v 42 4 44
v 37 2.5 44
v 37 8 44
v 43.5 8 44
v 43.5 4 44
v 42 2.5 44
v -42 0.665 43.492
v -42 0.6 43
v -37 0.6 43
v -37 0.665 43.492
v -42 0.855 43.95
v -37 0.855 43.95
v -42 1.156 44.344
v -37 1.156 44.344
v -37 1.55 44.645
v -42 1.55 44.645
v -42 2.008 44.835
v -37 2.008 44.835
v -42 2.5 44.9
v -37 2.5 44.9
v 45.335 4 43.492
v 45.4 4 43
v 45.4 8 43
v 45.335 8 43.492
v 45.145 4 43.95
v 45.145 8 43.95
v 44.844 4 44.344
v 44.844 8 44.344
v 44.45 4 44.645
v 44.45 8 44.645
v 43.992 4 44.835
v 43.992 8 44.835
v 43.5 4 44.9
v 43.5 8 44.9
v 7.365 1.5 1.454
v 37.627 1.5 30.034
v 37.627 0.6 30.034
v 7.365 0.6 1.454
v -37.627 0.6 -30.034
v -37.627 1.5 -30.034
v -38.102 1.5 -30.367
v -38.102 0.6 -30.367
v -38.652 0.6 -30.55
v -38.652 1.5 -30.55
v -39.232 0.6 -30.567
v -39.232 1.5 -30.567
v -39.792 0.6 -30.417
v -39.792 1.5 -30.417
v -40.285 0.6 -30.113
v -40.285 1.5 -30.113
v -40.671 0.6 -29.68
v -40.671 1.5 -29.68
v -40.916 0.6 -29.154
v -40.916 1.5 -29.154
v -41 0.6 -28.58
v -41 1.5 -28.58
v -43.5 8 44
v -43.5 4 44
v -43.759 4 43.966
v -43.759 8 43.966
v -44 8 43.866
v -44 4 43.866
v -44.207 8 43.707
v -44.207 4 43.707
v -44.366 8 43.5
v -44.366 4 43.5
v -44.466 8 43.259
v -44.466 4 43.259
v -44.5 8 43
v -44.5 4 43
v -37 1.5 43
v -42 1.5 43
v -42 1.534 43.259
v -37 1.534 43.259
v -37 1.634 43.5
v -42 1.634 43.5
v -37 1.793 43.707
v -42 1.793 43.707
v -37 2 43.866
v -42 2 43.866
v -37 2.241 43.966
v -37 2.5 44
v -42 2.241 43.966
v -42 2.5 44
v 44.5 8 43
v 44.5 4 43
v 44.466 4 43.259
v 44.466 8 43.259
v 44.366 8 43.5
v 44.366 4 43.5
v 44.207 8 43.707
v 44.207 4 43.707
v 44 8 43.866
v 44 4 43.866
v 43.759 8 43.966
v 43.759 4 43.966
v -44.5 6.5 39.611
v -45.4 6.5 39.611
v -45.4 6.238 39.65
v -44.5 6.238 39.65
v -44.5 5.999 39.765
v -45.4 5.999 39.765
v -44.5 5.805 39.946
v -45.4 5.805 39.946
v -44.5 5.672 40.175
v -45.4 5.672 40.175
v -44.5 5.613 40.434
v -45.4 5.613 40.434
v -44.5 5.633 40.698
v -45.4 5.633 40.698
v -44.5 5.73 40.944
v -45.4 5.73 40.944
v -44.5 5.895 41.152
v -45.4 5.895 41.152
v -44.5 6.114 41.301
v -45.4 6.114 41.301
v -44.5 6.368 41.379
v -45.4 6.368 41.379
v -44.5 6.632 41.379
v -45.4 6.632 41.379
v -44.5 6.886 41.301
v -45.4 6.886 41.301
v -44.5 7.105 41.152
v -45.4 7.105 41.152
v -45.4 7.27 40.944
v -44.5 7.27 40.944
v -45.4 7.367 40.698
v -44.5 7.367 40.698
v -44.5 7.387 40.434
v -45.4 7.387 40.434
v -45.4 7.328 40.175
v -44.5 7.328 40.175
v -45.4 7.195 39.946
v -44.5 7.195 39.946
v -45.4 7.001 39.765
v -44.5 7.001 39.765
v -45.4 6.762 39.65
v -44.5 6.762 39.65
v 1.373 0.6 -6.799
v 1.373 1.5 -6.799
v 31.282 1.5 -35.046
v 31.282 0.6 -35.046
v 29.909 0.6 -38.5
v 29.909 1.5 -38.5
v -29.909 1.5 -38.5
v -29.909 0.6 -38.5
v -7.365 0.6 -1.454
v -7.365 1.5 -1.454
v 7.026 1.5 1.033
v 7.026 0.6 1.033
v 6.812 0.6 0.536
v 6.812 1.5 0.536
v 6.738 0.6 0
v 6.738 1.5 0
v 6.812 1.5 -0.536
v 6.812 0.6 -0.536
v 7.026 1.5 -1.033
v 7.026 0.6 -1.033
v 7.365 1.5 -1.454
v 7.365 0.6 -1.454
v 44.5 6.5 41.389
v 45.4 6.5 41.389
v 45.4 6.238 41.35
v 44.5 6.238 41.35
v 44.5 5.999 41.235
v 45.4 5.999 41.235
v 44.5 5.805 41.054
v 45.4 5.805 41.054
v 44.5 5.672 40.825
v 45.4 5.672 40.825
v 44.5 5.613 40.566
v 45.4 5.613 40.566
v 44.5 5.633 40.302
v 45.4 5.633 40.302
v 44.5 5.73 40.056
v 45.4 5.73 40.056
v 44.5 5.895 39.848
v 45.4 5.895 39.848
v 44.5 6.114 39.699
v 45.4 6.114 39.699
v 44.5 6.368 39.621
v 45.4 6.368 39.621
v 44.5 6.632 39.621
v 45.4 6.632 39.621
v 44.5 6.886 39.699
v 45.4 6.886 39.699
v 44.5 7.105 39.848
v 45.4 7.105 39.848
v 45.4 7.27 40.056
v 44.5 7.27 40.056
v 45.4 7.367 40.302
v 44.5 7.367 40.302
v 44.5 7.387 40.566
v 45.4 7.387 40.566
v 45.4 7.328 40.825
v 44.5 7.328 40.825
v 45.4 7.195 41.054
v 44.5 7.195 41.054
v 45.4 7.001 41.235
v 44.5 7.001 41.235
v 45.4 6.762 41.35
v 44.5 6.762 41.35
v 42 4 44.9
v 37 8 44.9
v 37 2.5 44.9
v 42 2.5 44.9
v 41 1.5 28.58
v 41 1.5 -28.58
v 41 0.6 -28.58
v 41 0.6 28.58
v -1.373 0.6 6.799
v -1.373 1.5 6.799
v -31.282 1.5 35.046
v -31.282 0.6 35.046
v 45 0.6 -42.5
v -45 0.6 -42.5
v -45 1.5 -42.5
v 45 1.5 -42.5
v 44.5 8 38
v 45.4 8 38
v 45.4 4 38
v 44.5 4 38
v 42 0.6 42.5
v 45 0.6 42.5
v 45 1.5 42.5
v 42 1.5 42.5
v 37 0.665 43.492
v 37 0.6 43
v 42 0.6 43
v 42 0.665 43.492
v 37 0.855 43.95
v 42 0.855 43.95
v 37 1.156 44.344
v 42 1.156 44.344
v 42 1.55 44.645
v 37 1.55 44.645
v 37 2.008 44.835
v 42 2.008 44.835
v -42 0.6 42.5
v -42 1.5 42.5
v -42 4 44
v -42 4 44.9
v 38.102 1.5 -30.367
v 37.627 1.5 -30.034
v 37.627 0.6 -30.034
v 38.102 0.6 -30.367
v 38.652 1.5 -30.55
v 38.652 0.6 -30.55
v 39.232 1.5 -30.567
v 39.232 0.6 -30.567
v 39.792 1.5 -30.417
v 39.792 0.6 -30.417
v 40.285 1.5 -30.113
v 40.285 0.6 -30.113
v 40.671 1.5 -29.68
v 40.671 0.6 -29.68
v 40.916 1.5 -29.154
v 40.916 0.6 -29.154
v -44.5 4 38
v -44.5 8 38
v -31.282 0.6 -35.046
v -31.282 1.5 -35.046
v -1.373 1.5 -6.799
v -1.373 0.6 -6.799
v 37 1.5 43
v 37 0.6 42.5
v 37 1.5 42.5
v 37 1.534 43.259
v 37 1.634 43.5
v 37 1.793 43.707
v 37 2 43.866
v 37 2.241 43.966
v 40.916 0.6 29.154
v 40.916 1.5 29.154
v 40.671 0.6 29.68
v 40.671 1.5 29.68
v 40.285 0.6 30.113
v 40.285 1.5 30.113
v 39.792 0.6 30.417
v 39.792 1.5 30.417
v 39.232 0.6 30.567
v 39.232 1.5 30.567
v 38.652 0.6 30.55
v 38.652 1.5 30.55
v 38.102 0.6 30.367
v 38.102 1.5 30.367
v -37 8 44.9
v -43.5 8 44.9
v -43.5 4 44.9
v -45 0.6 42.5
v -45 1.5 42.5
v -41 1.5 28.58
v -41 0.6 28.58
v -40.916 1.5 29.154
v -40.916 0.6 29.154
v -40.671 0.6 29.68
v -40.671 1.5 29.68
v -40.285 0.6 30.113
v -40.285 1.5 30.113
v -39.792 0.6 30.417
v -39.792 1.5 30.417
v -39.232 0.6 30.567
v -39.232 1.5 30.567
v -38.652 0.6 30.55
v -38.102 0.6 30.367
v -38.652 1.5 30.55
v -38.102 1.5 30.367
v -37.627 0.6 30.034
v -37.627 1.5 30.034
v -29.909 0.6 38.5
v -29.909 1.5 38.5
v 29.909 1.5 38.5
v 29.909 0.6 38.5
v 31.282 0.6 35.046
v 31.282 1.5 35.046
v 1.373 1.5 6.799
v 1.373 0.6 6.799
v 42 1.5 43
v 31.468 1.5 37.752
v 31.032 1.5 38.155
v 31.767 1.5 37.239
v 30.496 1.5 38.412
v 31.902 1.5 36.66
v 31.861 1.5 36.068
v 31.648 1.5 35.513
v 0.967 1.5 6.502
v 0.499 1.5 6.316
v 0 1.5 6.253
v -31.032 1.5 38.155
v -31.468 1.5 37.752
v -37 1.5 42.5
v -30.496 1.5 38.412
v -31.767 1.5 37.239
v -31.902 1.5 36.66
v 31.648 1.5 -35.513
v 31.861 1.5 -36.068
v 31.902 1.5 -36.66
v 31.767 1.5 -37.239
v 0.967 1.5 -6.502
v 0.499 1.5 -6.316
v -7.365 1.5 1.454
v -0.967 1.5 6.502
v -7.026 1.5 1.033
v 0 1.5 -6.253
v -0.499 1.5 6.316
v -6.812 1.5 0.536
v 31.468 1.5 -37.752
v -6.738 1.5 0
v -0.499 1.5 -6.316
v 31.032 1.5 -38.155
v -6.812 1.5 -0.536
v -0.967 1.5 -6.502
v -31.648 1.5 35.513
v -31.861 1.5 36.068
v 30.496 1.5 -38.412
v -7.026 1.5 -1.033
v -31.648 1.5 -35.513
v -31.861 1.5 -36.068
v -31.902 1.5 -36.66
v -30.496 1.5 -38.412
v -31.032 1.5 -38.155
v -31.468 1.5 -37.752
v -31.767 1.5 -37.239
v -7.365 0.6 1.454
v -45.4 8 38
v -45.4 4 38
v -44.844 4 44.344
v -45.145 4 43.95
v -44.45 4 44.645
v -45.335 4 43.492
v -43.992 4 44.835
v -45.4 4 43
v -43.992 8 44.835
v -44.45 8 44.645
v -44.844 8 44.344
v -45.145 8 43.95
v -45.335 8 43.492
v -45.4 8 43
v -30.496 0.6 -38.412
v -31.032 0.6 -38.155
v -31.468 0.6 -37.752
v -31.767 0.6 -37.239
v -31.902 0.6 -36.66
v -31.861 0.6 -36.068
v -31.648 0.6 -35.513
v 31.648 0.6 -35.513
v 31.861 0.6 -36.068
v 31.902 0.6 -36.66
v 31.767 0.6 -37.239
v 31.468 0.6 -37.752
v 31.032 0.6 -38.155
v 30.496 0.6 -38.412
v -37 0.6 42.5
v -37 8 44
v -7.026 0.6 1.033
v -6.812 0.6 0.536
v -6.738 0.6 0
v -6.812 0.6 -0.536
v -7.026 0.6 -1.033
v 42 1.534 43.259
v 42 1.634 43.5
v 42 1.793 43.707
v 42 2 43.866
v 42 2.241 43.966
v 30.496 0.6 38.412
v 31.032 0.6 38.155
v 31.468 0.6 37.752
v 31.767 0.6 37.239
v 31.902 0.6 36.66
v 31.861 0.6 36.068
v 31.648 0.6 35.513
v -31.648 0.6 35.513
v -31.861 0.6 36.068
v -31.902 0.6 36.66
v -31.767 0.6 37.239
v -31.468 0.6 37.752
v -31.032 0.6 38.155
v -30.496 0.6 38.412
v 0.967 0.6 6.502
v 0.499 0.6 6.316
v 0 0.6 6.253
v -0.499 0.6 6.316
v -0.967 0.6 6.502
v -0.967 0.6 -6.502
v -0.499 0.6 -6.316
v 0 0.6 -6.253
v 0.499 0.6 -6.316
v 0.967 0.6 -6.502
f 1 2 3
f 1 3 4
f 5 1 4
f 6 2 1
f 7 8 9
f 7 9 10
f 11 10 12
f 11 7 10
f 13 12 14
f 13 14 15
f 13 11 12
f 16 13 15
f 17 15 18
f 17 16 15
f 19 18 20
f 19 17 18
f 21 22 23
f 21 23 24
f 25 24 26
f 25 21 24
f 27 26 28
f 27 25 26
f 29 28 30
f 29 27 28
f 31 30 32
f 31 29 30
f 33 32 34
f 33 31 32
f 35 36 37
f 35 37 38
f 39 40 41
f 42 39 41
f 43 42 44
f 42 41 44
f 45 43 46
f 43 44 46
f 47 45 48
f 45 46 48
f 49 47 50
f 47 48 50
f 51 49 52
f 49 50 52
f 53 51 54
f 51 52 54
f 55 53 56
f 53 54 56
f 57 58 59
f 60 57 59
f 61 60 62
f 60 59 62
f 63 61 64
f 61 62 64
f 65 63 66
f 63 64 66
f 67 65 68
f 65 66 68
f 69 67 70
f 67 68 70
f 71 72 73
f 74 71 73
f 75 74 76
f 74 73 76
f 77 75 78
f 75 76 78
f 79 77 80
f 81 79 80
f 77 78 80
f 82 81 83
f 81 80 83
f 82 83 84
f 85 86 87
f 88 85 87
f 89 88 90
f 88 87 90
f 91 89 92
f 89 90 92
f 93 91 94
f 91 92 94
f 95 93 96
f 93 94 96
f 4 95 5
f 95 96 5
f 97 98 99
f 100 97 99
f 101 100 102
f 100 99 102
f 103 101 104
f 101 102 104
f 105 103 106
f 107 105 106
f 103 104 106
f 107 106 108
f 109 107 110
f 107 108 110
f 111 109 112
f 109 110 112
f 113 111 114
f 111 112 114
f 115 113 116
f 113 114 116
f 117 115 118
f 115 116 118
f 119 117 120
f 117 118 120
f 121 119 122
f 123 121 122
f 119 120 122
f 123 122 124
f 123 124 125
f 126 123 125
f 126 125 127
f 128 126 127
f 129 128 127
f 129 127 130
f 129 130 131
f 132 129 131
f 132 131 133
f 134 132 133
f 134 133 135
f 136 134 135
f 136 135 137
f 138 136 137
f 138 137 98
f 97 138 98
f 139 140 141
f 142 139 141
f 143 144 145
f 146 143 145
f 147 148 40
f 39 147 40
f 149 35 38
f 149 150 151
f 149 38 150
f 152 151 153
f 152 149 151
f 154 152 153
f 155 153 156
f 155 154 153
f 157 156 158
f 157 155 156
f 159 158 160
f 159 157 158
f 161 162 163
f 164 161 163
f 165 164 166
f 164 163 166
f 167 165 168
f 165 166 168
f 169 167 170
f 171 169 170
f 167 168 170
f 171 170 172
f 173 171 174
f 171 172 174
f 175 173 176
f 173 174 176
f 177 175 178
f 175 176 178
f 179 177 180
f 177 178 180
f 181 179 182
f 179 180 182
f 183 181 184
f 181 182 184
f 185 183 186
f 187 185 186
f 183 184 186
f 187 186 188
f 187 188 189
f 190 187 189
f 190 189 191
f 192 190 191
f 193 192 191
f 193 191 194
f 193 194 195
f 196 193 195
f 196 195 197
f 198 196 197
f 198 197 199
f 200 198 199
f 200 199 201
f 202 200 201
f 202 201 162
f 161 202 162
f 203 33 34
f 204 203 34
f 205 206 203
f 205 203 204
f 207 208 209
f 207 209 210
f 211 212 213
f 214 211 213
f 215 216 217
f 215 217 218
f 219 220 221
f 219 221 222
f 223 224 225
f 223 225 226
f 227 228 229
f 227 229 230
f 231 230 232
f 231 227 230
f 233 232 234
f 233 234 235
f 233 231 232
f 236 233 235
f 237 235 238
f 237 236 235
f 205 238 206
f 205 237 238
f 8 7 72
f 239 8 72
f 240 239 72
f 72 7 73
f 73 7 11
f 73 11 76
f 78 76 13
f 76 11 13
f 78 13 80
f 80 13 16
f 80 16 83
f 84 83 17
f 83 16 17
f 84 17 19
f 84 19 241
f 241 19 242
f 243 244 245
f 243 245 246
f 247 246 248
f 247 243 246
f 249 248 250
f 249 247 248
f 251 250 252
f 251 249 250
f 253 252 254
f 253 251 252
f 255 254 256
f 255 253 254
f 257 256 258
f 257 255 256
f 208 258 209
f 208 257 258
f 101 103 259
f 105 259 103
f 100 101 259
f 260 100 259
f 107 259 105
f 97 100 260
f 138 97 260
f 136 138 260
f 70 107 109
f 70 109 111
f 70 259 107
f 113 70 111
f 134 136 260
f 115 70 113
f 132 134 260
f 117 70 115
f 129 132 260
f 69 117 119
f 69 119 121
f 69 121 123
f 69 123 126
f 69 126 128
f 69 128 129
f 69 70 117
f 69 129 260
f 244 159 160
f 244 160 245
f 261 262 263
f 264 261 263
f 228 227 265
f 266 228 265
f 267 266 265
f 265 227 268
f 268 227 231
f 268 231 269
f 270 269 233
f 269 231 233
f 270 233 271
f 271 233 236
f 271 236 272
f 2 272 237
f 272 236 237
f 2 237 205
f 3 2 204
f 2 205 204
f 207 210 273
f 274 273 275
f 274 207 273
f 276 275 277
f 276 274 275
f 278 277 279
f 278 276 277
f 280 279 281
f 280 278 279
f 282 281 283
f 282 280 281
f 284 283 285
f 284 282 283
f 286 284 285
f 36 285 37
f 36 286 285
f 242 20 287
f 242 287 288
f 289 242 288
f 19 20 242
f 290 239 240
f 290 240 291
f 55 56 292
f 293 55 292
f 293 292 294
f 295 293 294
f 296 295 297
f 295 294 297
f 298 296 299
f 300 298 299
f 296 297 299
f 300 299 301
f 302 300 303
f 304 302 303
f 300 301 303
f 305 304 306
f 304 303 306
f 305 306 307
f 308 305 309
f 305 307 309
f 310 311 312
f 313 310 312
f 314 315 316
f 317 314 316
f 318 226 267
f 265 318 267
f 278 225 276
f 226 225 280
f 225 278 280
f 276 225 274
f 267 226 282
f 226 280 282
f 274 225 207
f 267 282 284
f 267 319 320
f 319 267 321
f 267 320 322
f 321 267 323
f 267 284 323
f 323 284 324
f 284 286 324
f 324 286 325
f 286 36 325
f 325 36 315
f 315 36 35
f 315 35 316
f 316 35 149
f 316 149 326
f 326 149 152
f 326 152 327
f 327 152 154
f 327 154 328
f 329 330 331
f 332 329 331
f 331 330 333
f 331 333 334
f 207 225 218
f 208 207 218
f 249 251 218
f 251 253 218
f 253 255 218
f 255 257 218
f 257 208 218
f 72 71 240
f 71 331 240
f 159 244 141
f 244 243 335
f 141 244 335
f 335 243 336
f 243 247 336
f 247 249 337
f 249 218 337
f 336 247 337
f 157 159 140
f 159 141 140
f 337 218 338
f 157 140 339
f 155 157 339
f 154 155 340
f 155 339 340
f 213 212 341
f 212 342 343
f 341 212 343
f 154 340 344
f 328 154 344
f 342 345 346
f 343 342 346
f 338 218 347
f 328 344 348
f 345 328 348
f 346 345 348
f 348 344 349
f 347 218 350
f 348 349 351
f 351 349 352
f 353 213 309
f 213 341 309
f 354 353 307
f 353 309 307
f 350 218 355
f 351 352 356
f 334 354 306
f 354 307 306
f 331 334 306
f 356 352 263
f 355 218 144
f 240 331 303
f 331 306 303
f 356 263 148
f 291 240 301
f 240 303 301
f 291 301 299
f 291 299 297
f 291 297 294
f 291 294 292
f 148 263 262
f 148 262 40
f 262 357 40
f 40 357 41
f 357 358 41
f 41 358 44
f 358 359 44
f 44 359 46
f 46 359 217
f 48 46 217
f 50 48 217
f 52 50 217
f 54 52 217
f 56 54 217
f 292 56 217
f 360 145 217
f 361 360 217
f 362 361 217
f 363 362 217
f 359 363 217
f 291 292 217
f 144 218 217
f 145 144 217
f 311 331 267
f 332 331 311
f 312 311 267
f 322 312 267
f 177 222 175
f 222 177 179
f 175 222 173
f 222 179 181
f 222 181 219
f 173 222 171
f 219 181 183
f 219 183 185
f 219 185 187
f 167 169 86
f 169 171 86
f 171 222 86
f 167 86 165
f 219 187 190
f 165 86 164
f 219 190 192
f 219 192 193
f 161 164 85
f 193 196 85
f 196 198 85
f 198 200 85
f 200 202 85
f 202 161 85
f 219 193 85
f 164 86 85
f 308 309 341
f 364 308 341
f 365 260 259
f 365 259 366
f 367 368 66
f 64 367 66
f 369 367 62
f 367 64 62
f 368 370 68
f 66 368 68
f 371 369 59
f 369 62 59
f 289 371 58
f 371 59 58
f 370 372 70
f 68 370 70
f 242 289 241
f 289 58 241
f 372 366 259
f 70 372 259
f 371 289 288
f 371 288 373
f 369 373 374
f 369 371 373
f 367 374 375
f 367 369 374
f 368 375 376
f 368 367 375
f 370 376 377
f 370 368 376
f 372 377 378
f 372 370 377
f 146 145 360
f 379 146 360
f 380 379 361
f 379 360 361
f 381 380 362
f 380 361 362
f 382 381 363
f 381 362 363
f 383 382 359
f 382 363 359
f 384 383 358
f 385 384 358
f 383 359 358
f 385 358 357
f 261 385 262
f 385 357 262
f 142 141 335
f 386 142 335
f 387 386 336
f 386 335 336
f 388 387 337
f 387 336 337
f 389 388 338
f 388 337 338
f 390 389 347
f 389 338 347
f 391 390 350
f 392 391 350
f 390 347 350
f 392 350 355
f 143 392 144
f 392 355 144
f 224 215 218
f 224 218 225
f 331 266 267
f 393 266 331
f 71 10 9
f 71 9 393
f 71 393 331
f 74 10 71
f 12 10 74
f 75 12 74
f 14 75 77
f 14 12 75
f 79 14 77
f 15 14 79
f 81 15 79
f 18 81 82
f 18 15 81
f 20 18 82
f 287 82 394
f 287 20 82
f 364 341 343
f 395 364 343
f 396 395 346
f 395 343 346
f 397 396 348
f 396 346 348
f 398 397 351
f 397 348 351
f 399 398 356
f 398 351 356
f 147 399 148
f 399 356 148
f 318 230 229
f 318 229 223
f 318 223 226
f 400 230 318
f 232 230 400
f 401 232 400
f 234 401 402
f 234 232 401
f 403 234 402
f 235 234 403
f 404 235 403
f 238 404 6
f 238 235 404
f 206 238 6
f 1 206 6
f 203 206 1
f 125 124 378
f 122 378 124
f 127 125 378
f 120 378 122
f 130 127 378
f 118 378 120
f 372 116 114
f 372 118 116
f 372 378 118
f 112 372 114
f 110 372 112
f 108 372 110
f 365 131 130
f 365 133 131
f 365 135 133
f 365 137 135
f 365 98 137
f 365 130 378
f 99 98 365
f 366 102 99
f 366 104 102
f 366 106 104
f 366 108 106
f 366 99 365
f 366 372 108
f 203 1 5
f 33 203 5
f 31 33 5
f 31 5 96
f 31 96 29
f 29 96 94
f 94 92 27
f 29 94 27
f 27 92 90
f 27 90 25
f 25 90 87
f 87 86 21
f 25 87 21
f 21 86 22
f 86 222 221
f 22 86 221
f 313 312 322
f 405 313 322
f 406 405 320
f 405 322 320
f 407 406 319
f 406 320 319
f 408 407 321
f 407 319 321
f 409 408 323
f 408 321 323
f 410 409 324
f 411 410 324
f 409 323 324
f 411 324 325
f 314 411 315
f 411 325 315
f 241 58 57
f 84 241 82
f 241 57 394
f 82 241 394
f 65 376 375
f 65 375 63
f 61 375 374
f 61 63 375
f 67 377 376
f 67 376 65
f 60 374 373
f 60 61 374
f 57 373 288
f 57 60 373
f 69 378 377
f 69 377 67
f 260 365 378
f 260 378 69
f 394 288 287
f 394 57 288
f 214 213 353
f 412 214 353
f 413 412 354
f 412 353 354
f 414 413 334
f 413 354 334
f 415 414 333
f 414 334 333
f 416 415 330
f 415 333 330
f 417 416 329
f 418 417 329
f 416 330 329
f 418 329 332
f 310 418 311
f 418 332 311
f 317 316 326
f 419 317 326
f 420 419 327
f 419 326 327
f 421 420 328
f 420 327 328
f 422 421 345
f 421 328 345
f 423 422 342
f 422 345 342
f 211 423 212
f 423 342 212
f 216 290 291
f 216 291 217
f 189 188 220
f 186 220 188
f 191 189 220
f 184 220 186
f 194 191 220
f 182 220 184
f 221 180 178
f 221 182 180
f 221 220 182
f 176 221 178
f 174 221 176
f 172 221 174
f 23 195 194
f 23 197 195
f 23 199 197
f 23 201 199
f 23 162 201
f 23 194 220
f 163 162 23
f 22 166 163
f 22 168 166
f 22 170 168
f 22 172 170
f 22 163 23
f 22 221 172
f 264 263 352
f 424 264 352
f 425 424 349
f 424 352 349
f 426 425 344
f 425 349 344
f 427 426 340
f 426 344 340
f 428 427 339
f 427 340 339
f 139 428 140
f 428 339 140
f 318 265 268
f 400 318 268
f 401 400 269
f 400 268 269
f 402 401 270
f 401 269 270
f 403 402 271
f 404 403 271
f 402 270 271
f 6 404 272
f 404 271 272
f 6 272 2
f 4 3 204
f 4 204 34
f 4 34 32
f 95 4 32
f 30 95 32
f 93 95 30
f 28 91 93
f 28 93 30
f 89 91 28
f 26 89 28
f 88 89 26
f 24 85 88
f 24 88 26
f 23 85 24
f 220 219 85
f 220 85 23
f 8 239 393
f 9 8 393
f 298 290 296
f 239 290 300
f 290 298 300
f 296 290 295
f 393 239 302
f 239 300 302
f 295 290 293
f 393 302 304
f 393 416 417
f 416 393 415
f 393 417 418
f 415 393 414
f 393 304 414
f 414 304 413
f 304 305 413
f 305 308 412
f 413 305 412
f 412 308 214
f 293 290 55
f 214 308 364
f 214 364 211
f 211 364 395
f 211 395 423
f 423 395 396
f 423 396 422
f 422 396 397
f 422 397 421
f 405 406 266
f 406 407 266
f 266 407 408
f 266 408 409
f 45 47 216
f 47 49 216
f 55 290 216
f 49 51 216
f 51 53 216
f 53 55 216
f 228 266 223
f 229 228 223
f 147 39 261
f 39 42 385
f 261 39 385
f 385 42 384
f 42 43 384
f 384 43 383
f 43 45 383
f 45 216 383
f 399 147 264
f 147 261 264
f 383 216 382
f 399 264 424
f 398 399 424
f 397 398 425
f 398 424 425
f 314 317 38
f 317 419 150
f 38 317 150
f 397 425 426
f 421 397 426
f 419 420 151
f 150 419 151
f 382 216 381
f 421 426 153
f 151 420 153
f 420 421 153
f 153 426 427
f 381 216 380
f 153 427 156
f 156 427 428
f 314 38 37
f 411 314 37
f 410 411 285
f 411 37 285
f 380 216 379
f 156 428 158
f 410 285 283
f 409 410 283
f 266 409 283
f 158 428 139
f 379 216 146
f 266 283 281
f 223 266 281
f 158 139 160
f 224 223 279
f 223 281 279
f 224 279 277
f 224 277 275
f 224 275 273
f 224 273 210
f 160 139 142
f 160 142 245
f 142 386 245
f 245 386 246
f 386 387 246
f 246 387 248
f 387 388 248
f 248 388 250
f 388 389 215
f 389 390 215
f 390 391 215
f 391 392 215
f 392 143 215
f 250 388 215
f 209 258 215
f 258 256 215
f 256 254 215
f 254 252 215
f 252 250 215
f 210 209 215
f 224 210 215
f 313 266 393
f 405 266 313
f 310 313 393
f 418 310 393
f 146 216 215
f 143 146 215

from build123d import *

# Parameters (mm, degrees)
BOSS_EXTRUDE1_DEPTH                 = 1.5
SKETCH3_W                           = 5
SKETCH3_H                           = 1.5
BOSS_EXTRUDE2_DEPTH                 = 6.5
BOSS_EXTRUDE3_DEPTH                 = 6
BOSS_EXTRUDE3_DEPTH_BACK            = 1.5
SKETCH4_W                           = 1.5
SKETCH4_H                           = 4
BOSS_EXTRUDE3_2_DEPTH               = 6
BOSS_EXTRUDE3_2_DEPTH_BACK          = 1.5
SKETCH5_W                           = 2.5
SKETCH5_H                           = 1.5
BOSS_EXTRUDE4_DEPTH                 = 4
CONVERT_SOLID2_DEPTH                = 0.6
CONVERT_SOLID2_START                = 0.6
CONVERT_SOLID2_2_DEPTH              = 7.4
CONVERT_SOLID2_3_OUTLINE_W          = 5
CONVERT_SOLID2_3_OUTLINE_H          = 0.9
CONVERT_SOLID2_3_DEPTH              = 0.15504
CONVERT_SOLID2_START_2              = 4
CONVERT_SOLID2_4_DEPTH              = 4
CONVERT_SOLID2_START_3              = -42
CONVERT_SOLID2_5_DEPTH              = 84
CONVERT_SOLID2_6_DEPTH              = 5
CONVERT_SOLID2_START_4              = 37
CONVERT_SOLID2_7_DEPTH              = 5
F_0_CLEARANCE_HOLE1_D               = 1.778
F_0_CLEARANCE_HOLE1_DEPTH           = 3.175
F_0_CLEARANCE_HOLE1_TIP             = 0.53416509
F_0_CLEARANCE_HOLE1_ON_FACE_2_D     = 1.778
F_0_CLEARANCE_HOLE1_ON_FACE_2_DEPTH = 3.175
F_0_CLEARANCE_HOLE1_ON_FACE_2_TIP   = 0.53416509
CUT_EXTRUDE1_DEPTH                  = 65.182707952


with BuildPart() as part:
    # Sketch1 → Boss-Extrude1 (new body)
    with BuildSketch(Plane(origin=(0, 0, 0), x_dir=(1, 0, 0), z_dir=(0, 1, 0))):
        Polygon((-42, -45.5), (-42, -42.5), (-45, -42.5), (-45, 42.5), (45, 42.5), (45, -42.5), (42, -42.5), (42, -45.5), (37, -45.5), (37, -42.5), (-37, -42.5), (-37, -45.5), align=None)
    extrude(amount=BOSS_EXTRUDE1_DEPTH)

    # Sketch3 → Boss-Extrude2 (add)
    with BuildSketch(Plane(origin=(0, 1.5, 0), x_dir=(1, 0, 0), z_dir=(0, 1, 0))):
        with Locations((-39.5, -44.75)):
            Rectangle(SKETCH3_W, SKETCH3_H)
        with Locations((39.5, -44.75)):
            Rectangle(SKETCH3_W, SKETCH3_H)
    extrude(amount=BOSS_EXTRUDE2_DEPTH)



with BuildPart() as body_2:
    # Sketch4 → Boss-Extrude3 (new, two sides: drawn at the far end of the back side and taken through both)
    with BuildSketch(Plane(origin=(0, 0, 44), x_dir=(-1, 0, 0), z_dir=(0, 0, -1)).offset(-BOSS_EXTRUDE3_DEPTH_BACK)):
        with Locations((45.25, 6)):
            Rectangle(SKETCH4_W, SKETCH4_H)
    extrude(amount=BOSS_EXTRUDE3_DEPTH + BOSS_EXTRUDE3_DEPTH_BACK)


with BuildPart() as body_3:
    # Sketch4 → Boss-Extrude3 2 (new, two sides: drawn at the far end of the back side and taken through both)
    with BuildSketch(Plane(origin=(0, 0, 44), x_dir=(-1, 0, 0), z_dir=(0, 0, -1)).offset(-BOSS_EXTRUDE3_2_DEPTH_BACK)):
        with Locations((-45.25, 6)):
            Rectangle(SKETCH4_W, SKETCH4_H)
    extrude(amount=BOSS_EXTRUDE3_2_DEPTH + BOSS_EXTRUDE3_2_DEPTH_BACK)


with BuildPart() as part_1:
    add(part.part)

    add(body_2.part)  # Boss-Extrude4 merges body 2

    add(body_3.part)  # Boss-Extrude4 merges body 3
    # Sketch5 → Boss-Extrude4 (add)
    with BuildSketch(Plane(origin=(0, 8, 0), x_dir=(1, 0, 0), z_dir=(0, 1, 0))):
        with Locations((-43.25, -44.75)):
            Rectangle(SKETCH5_W, SKETCH5_H)
        with Locations((43.25, -44.75)):
            Rectangle(SKETCH5_W, SKETCH5_H)
    extrude(amount=-BOSS_EXTRUDE4_DEPTH)

    # Convert-Solid2: read off the stored shape, not the designer's step
    # Convert-Solid2 outline → Convert-Solid2 (cut)
    with BuildSketch(Plane(origin=(0, 0, 0), x_dir=(1, 0, 0), z_dir=(0, 1, 0))):
        Polygon((37, -45.5), (42, -45.5), (42, -42.5), (45, -42.5), (45, 42.5), (-45, 42.5), (-45, -42.5), (-42, -42.5), (-42, -45.5), (-37, -45.5), (-37, -42.5), (37, -42.5), align=None)
    extrude(amount=CONVERT_SOLID2_DEPTH, mode=Mode.SUBTRACT)

    # Convert-Solid2 2 outline → Convert-Solid2 2 (cut)
    with BuildSketch(Plane(origin=(0, 0, 0), x_dir=(1, 0, 0), z_dir=(0, 1, 0)).offset(CONVERT_SOLID2_START)):
        with BuildLine():
            Line((37, -45.5), (46, -45.5))
            Line((46, -45.5), (46, -38))
            Line((46, -38), (45.4, -38))
            Line((45.4, -38), (45.4, -43))
            ThreePointArc((45.4, -43), (44.843502884, -44.343502884), (43.5, -44.9))
            Line((43.5, -44.9), (37, -44.9))
            Line((37, -44.9), (37, -45.5))
        make_face()
        with BuildLine():
            Line((-37, -45.5), (-37, -44.9))
            Line((-37, -44.9), (-43.5, -44.9))
            ThreePointArc((-43.5, -44.9), (-44.843502884, -44.343502884), (-45.4, -43))
            Line((-45.4, -43), (-45.4, -38))
            Line((-45.4, -38), (-46, -38))
            Line((-46, -38), (-46, -45.5))
            Line((-46, -45.5), (-37, -45.5))
        make_face()
    extrude(amount=CONVERT_SOLID2_2_DEPTH, mode=Mode.SUBTRACT)

    # Convert-Solid2 3 outline → Convert-Solid2 3 (cut)
    with BuildSketch(Plane(origin=(0, 0, 0), x_dir=(1, 0, 0), z_dir=(0, 1, 0)).offset(CONVERT_SOLID2_START)):
        with Locations((39.5, -44.45)):
            Rectangle(CONVERT_SOLID2_3_OUTLINE_W, CONVERT_SOLID2_3_OUTLINE_H)
        with Locations((-39.5, -44.45)):
            Rectangle(CONVERT_SOLID2_3_OUTLINE_W, CONVERT_SOLID2_3_OUTLINE_H)
    extrude(amount=CONVERT_SOLID2_3_DEPTH, mode=Mode.SUBTRACT)

    # Convert-Solid2 4 outline → Convert-Solid2 4 (add)
    with BuildSketch(Plane(origin=(0, 0, 0), x_dir=(1, 0, 0), z_dir=(0, 1, 0)).offset(CONVERT_SOLID2_START_2)):
        with BuildLine():
            ThreePointArc((44.5, -43), (44.207106781, -43.707106781), (43.5, -44))
            Line((43.5, -44), (44.5, -44))
            Line((44.5, -44), (44.5, -43))
        make_face()
        with BuildLine():
            Line((-44.5, -44), (-43.5, -44))
            ThreePointArc((-43.5, -44), (-44.207106781, -43.707106781), (-44.5, -43))
            Line((-44.5, -43), (-44.5, -44))
        make_face()
    extrude(amount=CONVERT_SOLID2_4_DEPTH)

    # Convert-Solid2 5 outline → Convert-Solid2 5 (cut)
    with BuildSketch(Plane.YZ.offset(CONVERT_SOLID2_START_3)):
        with BuildLine():
            ThreePointArc((0.6, 43), (1.156497116, 44.343502884), (2.5, 44.9))
            Line((2.5, 44.9), (0.75504, 44.9))
            Line((0.75504, 44.9), (0.75504, 44))
            Line((0.75504, 44), (0.6, 44))
            Line((0.6, 44), (0.6, 43))
        make_face()
    extrude(amount=CONVERT_SOLID2_5_DEPTH, mode=Mode.SUBTRACT)

    # Convert-Solid2 6 outline → Convert-Solid2 6 (add)
    with BuildSketch(Plane.YZ.offset(CONVERT_SOLID2_START_3)):
        with BuildLine():
            ThreePointArc((1.5, 43), (1.792893219, 43.707106781), (2.5, 44))
            Line((2.5, 44), (1.5, 44))
            Line((1.5, 44), (1.5, 43))
        make_face()
    extrude(amount=CONVERT_SOLID2_6_DEPTH)

    # Convert-Solid2 7 outline → Convert-Solid2 7 (add)
    with BuildSketch(Plane.YZ.offset(CONVERT_SOLID2_START_4)):
        with BuildLine():
            ThreePointArc((1.5, 43), (1.792893219, 43.707106781), (2.5, 44))
            Line((2.5, 44), (1.5, 44))
            Line((1.5, 44), (1.5, 43))
        make_face()
    extrude(amount=CONVERT_SOLID2_7_DEPTH)

    # #0 Clearance Hole1
    with Locations(Plane(origin=(-44.5, 6.5, 40.5), x_dir=(0, 0, 1), z_dir=(1, 0, 0))):
        with Locations((0, 0)):
            Hole(F_0_CLEARANCE_HOLE1_D / 2, depth=F_0_CLEARANCE_HOLE1_DEPTH)
            with Locations((0, 0, -(F_0_CLEARANCE_HOLE1_DEPTH + F_0_CLEARANCE_HOLE1_TIP / 2))):  # 118° drill point
                Cone(0, F_0_CLEARANCE_HOLE1_D / 2, F_0_CLEARANCE_HOLE1_TIP, mode=Mode.SUBTRACT)

    # #0 Clearance Hole1 on face 2
    with Locations(Plane(origin=(44.5, 6.5, 40.5), x_dir=(0, 0, -1), z_dir=(-1, 0, 0))):
        with Locations((0, 0)):
            Hole(F_0_CLEARANCE_HOLE1_ON_FACE_2_D / 2, depth=F_0_CLEARANCE_HOLE1_ON_FACE_2_DEPTH)
            with Locations((0, 0, -(F_0_CLEARANCE_HOLE1_ON_FACE_2_DEPTH + F_0_CLEARANCE_HOLE1_ON_FACE_2_TIP / 2))):  # 118° drill point
                Cone(0, F_0_CLEARANCE_HOLE1_ON_FACE_2_D / 2, F_0_CLEARANCE_HOLE1_ON_FACE_2_TIP, mode=Mode.SUBTRACT)

    # Sketch18 → Cut-Extrude1 (cut, through all)
    with BuildSketch(Plane(origin=(0, 1.5, 0), x_dir=(1, 0, 0), z_dir=(0, 1, 0))):
        with BuildLine():
            Line((-1.373247066, -6.798919297), (-31.281892899, -35.045973695))
            ThreePointArc((-31.281892899, -35.045973695), (-31.767146924, -37.238900328), (-29.908645833, -38.5))
            Line((-29.908645833, -38.5), (29.908645833, -38.5))
            ThreePointArc((29.908645833, -38.5), (31.767146924, -37.238900328), (31.281892899, -35.045973695))
            Line((31.281892899, -35.045973695), (1.373247066, -6.798919297))
            ThreePointArc((1.373247066, -6.798919297), (0, -6.252945602), (-1.373247066, -6.798919297))
        make_face()
        with BuildLine():
            Line((-7.365165925, 1.454026305), (-37.626752934, 30.034414036))
            ThreePointArc((-37.626752934, 30.034414036), (-39.791677292, 30.417027888), (-41, 28.580387731))
            Line((-41, 28.580387731), (-41, -28.580387731))
            ThreePointArc((-41, -28.580387731), (-39.791677292, -30.417027888), (-37.626752934, -30.034414036))
            Line((-37.626752934, -30.034414036), (-7.365165925, -1.454026305))
            ThreePointArc((-7.365165925, -1.454026305), (-6.73841299, 0), (-7.365165925, 1.454026305))
        make_face()
        with BuildLine():
            Line((7.365165925, 1.454026305), (37.626752934, 30.034414036))
            ThreePointArc((37.626752934, 30.034414036), (39.791677292, 30.417027888), (41, 28.580387731))
            Line((41, 28.580387731), (41, -28.580387731))
            ThreePointArc((41, -28.580387731), (39.791677292, -30.417027888), (37.626752934, -30.034414036))
            Line((37.626752934, -30.034414036), (7.365165925, -1.454026305))
            ThreePointArc((7.365165925, -1.454026305), (6.73841299, 0), (7.365165925, 1.454026305))
        make_face()
        with BuildLine():
            Line((-31.281892899, 35.045973695), (-1.373247066, 6.798919297))
            ThreePointArc((-1.373247066, 6.798919297), (0, 6.252945602), (1.373247066, 6.798919297))
            Line((1.373247066, 6.798919297), (31.281892899, 35.045973695))
            ThreePointArc((31.281892899, 35.045973695), (31.767146924, 37.238900328), (29.908645833, 38.5))
            Line((29.908645833, 38.5), (-29.908645833, 38.5))
            ThreePointArc((-29.908645833, 38.5), (-31.767146924, 37.238900328), (-31.281892899, 35.045973695))
        make_face()
    extrude(amount=-CUT_EXTRUDE1_DEPTH, mode=Mode.SUBTRACT)


solid = part_1.part
